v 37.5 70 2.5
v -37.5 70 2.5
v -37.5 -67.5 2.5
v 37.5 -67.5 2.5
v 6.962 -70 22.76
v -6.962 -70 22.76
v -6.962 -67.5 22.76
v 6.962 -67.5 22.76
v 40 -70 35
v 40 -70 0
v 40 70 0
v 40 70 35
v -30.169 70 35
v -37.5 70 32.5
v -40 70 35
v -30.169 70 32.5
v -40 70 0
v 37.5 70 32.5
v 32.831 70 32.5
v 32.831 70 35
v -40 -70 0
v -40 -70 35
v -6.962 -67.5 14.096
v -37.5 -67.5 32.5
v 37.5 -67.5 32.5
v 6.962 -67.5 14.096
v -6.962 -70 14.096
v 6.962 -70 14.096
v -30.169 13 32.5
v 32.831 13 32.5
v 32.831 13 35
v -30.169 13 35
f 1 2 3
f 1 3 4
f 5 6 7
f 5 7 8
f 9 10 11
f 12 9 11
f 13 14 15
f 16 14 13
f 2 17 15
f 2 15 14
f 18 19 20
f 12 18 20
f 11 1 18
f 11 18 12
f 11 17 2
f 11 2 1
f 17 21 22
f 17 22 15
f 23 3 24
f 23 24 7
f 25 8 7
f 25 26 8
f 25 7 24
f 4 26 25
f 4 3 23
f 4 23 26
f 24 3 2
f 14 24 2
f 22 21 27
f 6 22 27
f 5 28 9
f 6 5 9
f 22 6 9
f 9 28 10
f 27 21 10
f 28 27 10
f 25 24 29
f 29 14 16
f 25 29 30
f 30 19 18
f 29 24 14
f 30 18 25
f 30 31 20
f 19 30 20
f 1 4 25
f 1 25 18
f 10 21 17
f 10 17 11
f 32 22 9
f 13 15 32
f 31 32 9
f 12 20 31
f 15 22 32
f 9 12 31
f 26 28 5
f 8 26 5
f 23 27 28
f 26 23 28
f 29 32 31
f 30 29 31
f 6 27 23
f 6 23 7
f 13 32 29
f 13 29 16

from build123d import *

# Parameters (mm, degrees)
F0_W     = 80
F0_H     = 140
F1_DEPTH = 35
F2_T     = -2.5
F3_W     = 63
F3_H     = 57
F4_DEPTH = 2.5
F5_W     = 13.924362
F5_H     = 8.664047
F6_DEPTH = 140.001


with BuildPart() as f1:
    # F0 (on Top) → F1 (new body)
    with BuildSketch(Plane.XY):
        Rectangle(F0_W, F0_H)
    extrude(amount=F1_DEPTH)

    # F2
    f2_openings = [f1.faces().sort_by_distance(p)[0] for p in [
        (0, 70, 17.5),
    ]]
    offset(amount=F2_T, openings=f2_openings)

    # F3 (on face) → F4 (cut)
    with BuildSketch(Plane.XY.offset(35)):
        with Locations((1.330548, 41.5)):
            Rectangle(F3_W, F3_H)
    extrude(amount=-F4_DEPTH, mode=Mode.SUBTRACT)

    # F5 (on face) → F6 (cut, through all)
    with BuildSketch(Plane.XZ.offset(70)):
        with Locations((0, 18.42829)):
            Rectangle(F5_W, F5_H)
    extrude(amount=-F6_DEPTH, mode=Mode.SUBTRACT)


solid = f1.part
